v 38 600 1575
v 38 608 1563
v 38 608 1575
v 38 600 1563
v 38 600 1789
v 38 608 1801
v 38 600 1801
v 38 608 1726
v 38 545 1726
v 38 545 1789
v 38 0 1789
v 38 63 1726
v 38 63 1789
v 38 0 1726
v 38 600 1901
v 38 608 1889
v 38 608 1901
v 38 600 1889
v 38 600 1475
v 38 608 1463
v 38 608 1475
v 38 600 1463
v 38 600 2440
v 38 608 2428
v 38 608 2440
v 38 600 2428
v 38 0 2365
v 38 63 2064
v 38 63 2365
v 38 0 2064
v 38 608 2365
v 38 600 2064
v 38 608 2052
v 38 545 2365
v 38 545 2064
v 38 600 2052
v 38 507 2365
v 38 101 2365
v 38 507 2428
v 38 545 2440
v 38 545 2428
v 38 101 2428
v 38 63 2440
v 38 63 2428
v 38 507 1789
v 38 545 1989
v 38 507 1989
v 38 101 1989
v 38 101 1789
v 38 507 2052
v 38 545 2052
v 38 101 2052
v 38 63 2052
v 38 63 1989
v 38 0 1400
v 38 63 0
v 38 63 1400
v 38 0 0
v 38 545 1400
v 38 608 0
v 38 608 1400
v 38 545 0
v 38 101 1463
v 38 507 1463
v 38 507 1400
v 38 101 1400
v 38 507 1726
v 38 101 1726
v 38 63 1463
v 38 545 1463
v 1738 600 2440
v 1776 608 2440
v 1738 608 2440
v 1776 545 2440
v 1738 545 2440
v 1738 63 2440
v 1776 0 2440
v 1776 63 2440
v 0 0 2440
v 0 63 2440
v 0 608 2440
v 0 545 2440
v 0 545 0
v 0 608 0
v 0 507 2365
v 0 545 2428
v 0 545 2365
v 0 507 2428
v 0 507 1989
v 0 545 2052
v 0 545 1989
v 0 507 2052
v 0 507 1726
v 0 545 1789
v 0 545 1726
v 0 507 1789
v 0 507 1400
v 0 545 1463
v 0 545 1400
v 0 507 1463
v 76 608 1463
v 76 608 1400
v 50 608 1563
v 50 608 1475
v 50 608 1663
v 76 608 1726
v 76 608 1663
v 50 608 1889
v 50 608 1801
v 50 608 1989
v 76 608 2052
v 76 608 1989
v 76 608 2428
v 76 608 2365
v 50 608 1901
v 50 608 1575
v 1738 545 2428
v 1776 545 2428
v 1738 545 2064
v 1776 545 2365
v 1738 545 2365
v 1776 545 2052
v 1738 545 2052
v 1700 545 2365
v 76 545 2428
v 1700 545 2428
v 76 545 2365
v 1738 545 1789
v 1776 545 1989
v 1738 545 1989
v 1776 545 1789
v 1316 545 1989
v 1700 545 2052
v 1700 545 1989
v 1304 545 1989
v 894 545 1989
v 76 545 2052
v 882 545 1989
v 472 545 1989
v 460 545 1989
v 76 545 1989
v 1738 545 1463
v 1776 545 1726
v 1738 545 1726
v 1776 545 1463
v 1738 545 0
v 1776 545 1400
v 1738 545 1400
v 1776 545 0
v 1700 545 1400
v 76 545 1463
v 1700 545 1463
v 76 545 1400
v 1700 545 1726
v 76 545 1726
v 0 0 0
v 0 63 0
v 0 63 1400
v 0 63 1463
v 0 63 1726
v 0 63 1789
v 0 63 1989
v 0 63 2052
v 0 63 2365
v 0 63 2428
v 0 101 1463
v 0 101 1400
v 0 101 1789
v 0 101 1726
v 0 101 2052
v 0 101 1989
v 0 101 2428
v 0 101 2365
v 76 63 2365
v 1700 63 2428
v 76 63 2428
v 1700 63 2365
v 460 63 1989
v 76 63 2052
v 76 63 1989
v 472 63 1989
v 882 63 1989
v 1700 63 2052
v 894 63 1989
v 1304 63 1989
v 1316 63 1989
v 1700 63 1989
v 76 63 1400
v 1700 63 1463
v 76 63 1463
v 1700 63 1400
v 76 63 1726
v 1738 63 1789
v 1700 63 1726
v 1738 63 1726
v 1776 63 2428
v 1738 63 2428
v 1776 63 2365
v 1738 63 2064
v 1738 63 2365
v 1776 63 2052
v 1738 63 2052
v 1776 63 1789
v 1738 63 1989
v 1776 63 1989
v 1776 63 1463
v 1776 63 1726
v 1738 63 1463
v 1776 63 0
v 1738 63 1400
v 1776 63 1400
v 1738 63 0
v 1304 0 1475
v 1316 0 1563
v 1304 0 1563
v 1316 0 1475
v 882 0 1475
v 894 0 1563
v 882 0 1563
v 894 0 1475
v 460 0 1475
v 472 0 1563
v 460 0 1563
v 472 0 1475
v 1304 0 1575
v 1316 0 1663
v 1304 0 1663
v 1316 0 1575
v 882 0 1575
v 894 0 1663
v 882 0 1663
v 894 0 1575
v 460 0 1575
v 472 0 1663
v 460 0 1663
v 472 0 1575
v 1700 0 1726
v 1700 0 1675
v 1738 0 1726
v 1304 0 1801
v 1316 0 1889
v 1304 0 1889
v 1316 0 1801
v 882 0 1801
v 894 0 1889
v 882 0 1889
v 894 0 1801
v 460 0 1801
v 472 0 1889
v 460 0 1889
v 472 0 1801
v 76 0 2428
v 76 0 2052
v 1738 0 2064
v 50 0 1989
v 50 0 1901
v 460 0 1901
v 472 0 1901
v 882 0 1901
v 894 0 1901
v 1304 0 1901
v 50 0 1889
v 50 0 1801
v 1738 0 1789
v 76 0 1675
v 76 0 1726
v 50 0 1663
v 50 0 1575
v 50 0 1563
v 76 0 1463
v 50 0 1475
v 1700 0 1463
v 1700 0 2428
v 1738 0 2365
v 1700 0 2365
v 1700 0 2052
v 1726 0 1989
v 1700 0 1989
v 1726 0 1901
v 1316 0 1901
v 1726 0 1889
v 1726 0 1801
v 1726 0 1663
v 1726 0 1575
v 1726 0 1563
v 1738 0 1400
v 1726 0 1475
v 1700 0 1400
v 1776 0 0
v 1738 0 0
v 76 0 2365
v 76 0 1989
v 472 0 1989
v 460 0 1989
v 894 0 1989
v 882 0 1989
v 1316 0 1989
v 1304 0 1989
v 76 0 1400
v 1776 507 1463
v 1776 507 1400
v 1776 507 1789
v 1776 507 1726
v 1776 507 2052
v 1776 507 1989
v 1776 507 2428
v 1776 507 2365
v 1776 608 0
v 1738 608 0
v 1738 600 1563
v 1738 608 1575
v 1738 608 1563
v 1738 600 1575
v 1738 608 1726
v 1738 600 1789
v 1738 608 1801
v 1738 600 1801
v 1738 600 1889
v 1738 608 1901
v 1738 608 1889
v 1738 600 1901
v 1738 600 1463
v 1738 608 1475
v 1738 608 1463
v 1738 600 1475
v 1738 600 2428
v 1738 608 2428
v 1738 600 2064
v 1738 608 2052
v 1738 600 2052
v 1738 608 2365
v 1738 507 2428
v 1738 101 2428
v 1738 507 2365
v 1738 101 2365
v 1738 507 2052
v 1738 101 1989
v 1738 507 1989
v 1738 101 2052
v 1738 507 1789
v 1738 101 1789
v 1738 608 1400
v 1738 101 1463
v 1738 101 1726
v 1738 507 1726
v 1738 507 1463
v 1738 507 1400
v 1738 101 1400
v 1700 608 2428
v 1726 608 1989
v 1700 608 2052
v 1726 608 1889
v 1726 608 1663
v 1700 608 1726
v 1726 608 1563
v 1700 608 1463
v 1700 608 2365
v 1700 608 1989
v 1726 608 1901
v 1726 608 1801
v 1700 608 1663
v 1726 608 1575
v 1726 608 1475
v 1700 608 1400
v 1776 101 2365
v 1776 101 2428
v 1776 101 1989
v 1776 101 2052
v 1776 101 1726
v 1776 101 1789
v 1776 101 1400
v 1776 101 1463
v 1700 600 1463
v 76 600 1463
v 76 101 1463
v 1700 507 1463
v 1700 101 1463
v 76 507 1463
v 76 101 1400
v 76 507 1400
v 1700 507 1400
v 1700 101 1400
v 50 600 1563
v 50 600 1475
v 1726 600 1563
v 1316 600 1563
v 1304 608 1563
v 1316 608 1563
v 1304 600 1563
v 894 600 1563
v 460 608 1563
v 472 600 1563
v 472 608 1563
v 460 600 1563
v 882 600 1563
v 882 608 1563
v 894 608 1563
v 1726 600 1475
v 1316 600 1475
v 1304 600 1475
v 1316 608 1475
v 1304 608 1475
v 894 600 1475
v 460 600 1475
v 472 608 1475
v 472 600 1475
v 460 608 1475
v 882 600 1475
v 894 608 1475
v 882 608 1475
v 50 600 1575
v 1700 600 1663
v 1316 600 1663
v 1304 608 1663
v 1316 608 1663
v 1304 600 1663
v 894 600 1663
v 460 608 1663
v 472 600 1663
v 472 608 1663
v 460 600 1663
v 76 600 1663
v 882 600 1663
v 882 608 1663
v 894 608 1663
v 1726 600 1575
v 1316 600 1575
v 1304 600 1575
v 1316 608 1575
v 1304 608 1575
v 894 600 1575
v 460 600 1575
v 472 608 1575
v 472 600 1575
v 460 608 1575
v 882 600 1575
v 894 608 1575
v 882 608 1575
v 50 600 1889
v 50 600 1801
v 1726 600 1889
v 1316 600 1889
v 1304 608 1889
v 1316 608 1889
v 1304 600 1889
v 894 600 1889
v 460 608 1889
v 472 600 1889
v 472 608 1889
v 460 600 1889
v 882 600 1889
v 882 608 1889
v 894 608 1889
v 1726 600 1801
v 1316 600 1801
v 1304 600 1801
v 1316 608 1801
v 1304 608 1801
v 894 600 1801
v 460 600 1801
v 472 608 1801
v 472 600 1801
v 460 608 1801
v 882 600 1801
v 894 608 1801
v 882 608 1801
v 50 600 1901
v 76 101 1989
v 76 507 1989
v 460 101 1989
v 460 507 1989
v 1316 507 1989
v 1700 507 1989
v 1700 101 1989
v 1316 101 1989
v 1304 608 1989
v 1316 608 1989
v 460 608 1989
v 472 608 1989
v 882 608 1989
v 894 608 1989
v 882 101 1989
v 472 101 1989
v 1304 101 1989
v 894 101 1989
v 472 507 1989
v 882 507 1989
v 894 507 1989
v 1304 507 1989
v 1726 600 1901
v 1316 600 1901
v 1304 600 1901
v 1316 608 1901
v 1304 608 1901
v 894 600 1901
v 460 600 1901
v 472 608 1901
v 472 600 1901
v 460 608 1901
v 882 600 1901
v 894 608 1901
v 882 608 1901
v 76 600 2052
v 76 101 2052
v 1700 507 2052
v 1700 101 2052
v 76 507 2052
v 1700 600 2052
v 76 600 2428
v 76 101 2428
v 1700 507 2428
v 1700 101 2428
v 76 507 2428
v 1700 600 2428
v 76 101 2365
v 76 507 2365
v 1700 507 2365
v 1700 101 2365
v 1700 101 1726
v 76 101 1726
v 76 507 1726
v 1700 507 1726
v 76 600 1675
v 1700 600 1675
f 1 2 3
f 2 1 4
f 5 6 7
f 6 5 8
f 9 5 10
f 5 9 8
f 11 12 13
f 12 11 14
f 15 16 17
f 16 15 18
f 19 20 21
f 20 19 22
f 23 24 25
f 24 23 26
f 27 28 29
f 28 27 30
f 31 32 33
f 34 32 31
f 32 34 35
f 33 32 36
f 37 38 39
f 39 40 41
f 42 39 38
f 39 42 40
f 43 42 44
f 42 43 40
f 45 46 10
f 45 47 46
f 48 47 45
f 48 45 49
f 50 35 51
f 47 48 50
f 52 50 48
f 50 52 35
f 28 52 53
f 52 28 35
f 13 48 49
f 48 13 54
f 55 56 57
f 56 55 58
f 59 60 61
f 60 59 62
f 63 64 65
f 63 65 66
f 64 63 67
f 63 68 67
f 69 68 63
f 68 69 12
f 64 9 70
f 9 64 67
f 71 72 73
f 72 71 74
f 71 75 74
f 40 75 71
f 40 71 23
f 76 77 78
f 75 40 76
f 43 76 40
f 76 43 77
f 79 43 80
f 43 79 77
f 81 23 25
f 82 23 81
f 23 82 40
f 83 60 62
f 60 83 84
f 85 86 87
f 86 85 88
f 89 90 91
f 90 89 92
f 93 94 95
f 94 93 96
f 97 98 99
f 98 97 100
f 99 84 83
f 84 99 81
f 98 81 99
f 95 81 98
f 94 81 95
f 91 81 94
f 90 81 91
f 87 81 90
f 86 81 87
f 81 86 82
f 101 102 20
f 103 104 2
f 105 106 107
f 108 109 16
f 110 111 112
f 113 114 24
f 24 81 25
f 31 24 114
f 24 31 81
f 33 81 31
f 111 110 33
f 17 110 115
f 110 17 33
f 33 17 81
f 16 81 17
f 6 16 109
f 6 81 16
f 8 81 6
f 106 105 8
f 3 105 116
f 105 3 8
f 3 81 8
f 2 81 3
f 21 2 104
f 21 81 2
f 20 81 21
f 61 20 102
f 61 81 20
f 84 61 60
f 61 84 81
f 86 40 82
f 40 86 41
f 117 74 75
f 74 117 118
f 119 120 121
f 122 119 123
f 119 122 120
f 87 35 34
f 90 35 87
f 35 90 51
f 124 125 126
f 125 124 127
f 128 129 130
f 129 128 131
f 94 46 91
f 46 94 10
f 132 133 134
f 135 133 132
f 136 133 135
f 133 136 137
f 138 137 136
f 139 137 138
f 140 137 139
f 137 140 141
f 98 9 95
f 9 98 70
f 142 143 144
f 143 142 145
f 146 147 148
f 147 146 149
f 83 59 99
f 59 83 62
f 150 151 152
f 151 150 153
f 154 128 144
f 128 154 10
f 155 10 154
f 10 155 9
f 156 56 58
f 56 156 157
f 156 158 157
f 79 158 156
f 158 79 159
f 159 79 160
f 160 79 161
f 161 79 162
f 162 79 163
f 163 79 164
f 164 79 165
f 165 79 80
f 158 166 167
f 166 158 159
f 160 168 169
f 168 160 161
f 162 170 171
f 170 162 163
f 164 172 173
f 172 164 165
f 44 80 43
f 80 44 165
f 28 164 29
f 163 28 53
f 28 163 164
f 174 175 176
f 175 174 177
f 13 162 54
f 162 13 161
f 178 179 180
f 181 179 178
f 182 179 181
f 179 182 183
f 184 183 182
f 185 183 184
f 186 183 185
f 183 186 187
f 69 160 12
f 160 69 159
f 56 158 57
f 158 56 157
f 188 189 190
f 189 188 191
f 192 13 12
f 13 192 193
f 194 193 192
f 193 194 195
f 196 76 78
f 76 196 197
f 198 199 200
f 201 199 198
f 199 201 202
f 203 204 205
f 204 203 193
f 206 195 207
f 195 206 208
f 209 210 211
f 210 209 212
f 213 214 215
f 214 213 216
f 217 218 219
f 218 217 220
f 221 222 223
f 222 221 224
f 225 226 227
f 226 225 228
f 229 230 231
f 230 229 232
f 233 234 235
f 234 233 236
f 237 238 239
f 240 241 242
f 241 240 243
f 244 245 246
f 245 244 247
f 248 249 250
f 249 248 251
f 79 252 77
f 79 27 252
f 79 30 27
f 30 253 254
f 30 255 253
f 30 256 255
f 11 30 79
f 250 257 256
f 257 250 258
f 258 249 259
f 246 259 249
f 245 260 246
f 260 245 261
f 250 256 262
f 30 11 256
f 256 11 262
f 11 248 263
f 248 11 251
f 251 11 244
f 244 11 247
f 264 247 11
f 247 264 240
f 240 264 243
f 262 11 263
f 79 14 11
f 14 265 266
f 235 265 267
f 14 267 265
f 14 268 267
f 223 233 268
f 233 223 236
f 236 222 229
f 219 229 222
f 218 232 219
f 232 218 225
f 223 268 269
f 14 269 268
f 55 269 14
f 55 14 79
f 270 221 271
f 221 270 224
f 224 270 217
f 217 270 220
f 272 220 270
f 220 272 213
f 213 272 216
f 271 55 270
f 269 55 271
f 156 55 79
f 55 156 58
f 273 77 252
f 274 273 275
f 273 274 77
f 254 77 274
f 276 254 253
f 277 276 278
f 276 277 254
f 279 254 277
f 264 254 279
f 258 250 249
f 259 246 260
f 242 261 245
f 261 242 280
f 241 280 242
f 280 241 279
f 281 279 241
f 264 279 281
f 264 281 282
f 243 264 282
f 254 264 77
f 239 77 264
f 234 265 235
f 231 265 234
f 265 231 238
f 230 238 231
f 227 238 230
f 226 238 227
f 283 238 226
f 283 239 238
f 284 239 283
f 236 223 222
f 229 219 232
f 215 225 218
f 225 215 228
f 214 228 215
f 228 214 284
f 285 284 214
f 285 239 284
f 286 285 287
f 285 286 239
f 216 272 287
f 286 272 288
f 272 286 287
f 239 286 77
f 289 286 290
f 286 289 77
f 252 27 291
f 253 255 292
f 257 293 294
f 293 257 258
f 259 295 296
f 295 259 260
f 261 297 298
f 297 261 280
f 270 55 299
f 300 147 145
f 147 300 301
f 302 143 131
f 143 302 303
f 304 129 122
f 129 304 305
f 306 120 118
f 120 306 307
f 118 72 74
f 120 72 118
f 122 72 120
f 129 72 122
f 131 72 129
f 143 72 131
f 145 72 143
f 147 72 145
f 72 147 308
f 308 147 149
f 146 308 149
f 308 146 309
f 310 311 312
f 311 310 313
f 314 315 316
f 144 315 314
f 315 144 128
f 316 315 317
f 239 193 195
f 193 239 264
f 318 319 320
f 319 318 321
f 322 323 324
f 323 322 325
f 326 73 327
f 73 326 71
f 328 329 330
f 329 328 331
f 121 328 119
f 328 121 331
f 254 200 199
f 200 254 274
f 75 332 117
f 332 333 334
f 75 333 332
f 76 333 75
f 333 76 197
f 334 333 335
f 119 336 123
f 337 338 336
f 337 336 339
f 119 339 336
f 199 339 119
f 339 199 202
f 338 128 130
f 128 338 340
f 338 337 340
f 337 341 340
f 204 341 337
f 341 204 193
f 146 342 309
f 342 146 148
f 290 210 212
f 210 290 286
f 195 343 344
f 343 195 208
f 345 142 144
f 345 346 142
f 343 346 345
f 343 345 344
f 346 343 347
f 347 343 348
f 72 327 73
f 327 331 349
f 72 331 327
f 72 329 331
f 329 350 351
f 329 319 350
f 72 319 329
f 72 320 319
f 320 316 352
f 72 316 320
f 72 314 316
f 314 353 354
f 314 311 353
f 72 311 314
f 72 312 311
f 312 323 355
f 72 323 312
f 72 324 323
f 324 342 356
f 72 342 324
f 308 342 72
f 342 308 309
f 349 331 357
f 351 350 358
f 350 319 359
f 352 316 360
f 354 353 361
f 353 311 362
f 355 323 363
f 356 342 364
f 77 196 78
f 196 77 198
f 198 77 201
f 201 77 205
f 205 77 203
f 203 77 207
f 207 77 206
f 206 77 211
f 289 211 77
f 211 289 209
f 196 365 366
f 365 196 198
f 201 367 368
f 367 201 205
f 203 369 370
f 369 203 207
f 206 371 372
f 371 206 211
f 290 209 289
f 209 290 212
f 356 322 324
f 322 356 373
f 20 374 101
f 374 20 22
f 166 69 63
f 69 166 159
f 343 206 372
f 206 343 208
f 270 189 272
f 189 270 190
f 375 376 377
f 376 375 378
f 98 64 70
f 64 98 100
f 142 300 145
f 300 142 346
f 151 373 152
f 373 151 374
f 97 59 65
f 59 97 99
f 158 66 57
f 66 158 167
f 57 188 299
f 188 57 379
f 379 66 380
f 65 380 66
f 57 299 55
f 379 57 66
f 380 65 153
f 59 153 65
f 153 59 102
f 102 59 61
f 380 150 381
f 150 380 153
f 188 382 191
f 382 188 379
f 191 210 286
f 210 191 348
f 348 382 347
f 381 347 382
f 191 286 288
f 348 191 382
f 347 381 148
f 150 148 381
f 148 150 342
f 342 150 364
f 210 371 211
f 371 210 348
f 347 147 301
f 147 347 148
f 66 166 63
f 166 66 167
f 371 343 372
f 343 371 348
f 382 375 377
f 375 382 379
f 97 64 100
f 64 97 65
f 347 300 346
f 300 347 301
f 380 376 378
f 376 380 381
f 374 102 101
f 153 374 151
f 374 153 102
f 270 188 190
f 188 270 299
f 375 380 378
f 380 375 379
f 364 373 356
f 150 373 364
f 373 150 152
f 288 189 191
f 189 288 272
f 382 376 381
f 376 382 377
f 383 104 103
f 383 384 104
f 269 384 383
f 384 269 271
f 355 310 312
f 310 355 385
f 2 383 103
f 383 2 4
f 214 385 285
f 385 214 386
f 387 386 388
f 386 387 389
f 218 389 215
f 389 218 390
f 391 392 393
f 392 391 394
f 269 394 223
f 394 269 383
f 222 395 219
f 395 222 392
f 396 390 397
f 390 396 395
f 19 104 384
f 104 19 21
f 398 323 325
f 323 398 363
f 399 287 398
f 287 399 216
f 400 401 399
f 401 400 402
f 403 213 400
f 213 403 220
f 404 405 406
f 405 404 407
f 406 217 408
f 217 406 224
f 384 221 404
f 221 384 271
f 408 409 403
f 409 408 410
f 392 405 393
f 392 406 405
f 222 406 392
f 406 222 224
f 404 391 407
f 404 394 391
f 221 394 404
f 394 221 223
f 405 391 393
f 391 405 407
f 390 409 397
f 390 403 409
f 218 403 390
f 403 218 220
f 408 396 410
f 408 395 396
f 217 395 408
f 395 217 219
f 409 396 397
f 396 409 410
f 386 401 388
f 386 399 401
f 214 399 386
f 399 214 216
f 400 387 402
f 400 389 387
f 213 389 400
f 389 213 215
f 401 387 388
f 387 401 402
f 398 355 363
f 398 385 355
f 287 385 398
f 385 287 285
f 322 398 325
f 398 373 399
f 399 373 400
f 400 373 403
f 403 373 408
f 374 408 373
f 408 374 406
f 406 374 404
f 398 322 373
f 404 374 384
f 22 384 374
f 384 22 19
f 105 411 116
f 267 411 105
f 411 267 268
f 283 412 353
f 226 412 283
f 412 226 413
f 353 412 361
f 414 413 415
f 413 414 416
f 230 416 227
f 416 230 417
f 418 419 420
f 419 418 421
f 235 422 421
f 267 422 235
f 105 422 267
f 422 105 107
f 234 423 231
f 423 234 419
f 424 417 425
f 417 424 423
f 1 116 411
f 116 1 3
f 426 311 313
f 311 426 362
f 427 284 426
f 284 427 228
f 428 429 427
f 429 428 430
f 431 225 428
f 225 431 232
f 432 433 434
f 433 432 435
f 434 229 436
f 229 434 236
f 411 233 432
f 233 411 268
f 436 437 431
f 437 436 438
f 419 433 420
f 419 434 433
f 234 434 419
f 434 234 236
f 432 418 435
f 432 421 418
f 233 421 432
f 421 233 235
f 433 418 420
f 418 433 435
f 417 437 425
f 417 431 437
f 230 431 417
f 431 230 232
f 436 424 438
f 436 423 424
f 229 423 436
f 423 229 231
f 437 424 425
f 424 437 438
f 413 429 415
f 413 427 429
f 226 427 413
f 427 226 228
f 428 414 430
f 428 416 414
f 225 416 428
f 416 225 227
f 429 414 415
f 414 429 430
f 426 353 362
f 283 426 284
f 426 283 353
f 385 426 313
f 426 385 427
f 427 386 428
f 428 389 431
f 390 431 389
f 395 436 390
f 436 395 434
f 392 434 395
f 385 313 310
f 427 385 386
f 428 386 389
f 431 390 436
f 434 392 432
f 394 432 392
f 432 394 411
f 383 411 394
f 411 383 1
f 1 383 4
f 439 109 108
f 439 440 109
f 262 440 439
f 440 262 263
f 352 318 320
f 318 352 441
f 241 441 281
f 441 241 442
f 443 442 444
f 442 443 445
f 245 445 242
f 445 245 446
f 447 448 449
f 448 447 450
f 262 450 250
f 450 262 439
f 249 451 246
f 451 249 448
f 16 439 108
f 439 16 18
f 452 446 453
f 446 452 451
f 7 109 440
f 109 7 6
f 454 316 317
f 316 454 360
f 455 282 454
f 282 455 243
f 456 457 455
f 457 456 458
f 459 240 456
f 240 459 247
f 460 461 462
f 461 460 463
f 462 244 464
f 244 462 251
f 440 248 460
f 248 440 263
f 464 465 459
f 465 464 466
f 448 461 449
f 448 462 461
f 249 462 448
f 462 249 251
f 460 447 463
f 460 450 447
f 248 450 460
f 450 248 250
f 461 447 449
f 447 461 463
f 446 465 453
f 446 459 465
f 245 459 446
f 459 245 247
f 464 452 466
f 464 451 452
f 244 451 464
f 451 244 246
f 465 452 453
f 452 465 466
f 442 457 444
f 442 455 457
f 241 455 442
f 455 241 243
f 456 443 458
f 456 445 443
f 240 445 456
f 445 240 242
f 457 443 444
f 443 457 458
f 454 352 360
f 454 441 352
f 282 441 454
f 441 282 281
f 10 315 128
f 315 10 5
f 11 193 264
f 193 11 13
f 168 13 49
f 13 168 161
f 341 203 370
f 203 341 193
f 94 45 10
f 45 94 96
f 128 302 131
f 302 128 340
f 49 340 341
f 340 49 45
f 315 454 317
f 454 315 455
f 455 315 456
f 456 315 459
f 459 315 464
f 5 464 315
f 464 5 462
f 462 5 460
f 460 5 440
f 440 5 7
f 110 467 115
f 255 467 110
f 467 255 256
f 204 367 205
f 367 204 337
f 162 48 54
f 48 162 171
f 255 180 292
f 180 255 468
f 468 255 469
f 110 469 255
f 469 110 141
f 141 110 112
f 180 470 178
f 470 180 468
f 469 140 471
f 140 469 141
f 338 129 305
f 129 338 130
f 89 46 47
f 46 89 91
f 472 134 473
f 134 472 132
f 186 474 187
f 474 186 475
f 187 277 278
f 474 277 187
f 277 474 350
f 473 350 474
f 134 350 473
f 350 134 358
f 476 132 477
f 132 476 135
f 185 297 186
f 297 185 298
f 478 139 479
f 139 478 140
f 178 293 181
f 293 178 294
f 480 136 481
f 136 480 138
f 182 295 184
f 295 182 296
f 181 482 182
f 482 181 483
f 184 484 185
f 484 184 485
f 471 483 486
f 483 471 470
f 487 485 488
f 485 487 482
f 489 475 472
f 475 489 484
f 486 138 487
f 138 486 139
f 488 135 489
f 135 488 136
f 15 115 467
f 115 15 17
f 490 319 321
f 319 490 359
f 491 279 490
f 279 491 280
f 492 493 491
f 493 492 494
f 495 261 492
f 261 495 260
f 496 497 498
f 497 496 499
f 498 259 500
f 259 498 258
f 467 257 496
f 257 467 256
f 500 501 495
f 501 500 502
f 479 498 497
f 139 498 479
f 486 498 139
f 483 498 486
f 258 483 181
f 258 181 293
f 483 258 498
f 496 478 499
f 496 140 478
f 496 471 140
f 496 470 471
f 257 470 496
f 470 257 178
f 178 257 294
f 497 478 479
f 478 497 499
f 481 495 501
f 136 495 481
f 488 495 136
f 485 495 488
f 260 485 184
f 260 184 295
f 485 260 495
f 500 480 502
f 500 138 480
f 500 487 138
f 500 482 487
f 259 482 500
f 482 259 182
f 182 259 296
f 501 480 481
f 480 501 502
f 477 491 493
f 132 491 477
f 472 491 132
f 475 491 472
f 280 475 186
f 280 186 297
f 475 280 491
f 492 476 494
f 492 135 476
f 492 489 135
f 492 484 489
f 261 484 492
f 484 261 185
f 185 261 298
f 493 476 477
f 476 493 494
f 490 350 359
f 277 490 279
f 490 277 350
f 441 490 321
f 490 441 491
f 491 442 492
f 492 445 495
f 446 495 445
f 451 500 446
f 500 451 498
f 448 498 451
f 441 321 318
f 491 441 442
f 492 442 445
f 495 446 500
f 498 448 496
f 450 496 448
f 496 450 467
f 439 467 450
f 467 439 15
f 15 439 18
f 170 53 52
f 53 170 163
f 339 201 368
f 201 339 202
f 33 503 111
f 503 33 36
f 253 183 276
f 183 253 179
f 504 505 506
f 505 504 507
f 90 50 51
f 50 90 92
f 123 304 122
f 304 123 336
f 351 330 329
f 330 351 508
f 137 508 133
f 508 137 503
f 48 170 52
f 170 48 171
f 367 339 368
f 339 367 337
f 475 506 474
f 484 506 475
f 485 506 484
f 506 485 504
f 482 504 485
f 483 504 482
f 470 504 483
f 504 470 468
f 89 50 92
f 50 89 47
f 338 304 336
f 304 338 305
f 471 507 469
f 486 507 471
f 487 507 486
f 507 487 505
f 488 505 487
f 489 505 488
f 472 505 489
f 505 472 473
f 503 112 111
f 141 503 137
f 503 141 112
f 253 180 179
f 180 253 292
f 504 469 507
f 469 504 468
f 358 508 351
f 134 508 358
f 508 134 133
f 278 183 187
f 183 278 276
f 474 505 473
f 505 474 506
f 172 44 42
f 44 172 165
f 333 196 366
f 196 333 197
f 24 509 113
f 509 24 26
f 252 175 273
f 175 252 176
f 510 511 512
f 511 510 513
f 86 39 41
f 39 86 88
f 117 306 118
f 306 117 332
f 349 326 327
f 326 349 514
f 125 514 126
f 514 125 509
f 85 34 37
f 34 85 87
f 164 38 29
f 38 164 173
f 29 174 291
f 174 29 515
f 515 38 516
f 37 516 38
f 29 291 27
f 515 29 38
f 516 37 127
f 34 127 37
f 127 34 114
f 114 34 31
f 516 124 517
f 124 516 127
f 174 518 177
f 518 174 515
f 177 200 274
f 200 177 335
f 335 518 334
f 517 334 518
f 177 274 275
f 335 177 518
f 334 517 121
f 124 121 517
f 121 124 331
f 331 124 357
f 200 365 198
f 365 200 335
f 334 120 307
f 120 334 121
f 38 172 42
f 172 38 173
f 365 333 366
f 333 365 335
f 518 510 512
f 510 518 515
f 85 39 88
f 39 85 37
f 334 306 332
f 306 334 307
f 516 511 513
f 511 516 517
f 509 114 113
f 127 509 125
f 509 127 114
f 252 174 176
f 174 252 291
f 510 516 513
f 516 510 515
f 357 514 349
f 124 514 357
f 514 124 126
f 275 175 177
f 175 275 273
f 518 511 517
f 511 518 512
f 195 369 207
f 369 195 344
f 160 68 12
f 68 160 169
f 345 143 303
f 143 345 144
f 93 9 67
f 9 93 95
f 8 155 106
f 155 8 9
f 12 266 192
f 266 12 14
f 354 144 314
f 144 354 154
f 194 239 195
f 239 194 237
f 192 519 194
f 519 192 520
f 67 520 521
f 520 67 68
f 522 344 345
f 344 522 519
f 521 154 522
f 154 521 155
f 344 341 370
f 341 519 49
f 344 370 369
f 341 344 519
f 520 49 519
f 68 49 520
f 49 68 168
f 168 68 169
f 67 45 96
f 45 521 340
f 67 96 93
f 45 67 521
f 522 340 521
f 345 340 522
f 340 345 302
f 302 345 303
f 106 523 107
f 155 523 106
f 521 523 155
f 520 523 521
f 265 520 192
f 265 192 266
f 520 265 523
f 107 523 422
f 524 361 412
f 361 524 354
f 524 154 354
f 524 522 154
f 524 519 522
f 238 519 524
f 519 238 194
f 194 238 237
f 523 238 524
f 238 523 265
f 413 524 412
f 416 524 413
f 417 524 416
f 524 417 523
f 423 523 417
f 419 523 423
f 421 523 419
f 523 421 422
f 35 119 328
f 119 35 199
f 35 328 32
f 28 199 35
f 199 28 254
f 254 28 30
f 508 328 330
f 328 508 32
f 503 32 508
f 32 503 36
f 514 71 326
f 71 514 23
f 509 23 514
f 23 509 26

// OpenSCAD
// Overall external size
width = 1700;
height = 2440;
depth  = 608;

cls_width = 38;
cls_height = 63;

material_x = 400;
material_y = 600;
material_z = 50;

shelf_x = 1700;
shelf_y = 600;
shelf_z = 88;

// Starting height for first shelf
shelf1 = 1400;

// Shelf thickness
thickness = 12;

// Right legs
right_legs = width + cls_width; // + (5 * thickness) + (4 * 405);

color("red"){
  // cls (63 x 38) left back & front
  translate([0,depth-cls_height,0])  { cube([38,63,height]); } // 1 x 2.4m
  translate([0,0,0])                 { cube([38,63,height]); } // 1 x 2.4m

  // cls (63 x 38) right back & front
  translate([right_legs,depth-cls_height,0]) { cube([38,63,height]); } // 1 x 2.4m
  translate([right_legs,0,0])                { cube([38,63,height]); } // 1 x 2.4m
}

/*

Measurements for laser shelving

Laser 170cm to wall from edge across
160 tall with lid up
115 from front to wall laser

*/

shelf_frame(shelf1);

s1 = shelf1 + cls_height;
s2 = s1 + thickness + shelf_z;
s3 = s2 + thickness + shelf_z + (2 * cls_height);
s4 = s3 + thickness + shelf_z;

storage_shelf(s1);
storage_shelf(s2);

// Shelf supports
translate([0, cls_height, s2 + thickness + shelf_z + cls_height]) {
           cube([width + (2 * cls_width), cls_width, cls_height]); } // front
translate([0, depth - cls_width - cls_height, s2 + thickness + shelf_z + cls_height]) {
           cube([width + (2 * cls_width), cls_width, cls_height]); } // back

translate([cls_width, 0, s2 + thickness + shelf_z]) {
           cube([cls_width, depth, cls_height]); } // left
translate([right_legs - cls_width, 0, s2 + thickness + shelf_z]) {
           cube([cls_width, depth, cls_height]); } // right

shelf_surface(s2 + thickness + shelf_z);

storage_shelf(s3);
storage_shelf(s4);

//test_pieces(s2);

shelf_frame(s4 + thickness + shelf_z);
shelf_surface(s4 + thickness + shelf_z + cls_height);

shelf_frame(height - thickness - cls_height);
shelf_surface(height - thickness);

// Shelf surface
module shelf_surface(z) {
  color("green") {
    translate([cls_width,
               0, z]) { cube([shelf_x, shelf_y, thickness]); }
  }
}

// Mitred shelf frame
module shelf_frame(z) {

  // Shelf supports
  translate([0, cls_height, z]) {
             cube([width + (2 * cls_width), cls_width, cls_height]); } // front
  translate([0, depth - cls_width - cls_height, z]) {
             cube([width + (2 * cls_width), cls_width, cls_height]); } // back
  translate([cls_width, 0, z]) {
             cube([cls_width, depth, cls_height]); } // left
  translate([right_legs - cls_width, 0, z]) {
             cube([cls_width, depth, cls_height]); } // right
}


module storage_shelf(shelf_height) {

  // Shelf surface
  color("green") {
    translate([cls_width,
               0, shelf_height]) { cube([shelf_x, shelf_y, thickness]); }
  }

  // Vertical shelf dividers
  color("black") {
    for(x = [0: 1: 4]) {
      translate([cls_width + ((material_x + 10 + thickness) * x),
                 0, shelf_height + thickness]) { cube([thickness, depth, shelf_z]); }
    }
  }

  echo(str("Shelf Height: ", shelf_height, "mm"));
}

// Use these to verify dimensions
module test_pieces(shelf_height) {
  // Test pieces
  color("blue"){
    for(x = [0: 1: 3]) {
      translate([cls_width + thickness + 2 + ((material_x + 10 + thickness) * x),
                 -20, shelf_height + thickness + 10]) {
        cube([material_x, material_y, material_z]);
      }
    }
  }
}
